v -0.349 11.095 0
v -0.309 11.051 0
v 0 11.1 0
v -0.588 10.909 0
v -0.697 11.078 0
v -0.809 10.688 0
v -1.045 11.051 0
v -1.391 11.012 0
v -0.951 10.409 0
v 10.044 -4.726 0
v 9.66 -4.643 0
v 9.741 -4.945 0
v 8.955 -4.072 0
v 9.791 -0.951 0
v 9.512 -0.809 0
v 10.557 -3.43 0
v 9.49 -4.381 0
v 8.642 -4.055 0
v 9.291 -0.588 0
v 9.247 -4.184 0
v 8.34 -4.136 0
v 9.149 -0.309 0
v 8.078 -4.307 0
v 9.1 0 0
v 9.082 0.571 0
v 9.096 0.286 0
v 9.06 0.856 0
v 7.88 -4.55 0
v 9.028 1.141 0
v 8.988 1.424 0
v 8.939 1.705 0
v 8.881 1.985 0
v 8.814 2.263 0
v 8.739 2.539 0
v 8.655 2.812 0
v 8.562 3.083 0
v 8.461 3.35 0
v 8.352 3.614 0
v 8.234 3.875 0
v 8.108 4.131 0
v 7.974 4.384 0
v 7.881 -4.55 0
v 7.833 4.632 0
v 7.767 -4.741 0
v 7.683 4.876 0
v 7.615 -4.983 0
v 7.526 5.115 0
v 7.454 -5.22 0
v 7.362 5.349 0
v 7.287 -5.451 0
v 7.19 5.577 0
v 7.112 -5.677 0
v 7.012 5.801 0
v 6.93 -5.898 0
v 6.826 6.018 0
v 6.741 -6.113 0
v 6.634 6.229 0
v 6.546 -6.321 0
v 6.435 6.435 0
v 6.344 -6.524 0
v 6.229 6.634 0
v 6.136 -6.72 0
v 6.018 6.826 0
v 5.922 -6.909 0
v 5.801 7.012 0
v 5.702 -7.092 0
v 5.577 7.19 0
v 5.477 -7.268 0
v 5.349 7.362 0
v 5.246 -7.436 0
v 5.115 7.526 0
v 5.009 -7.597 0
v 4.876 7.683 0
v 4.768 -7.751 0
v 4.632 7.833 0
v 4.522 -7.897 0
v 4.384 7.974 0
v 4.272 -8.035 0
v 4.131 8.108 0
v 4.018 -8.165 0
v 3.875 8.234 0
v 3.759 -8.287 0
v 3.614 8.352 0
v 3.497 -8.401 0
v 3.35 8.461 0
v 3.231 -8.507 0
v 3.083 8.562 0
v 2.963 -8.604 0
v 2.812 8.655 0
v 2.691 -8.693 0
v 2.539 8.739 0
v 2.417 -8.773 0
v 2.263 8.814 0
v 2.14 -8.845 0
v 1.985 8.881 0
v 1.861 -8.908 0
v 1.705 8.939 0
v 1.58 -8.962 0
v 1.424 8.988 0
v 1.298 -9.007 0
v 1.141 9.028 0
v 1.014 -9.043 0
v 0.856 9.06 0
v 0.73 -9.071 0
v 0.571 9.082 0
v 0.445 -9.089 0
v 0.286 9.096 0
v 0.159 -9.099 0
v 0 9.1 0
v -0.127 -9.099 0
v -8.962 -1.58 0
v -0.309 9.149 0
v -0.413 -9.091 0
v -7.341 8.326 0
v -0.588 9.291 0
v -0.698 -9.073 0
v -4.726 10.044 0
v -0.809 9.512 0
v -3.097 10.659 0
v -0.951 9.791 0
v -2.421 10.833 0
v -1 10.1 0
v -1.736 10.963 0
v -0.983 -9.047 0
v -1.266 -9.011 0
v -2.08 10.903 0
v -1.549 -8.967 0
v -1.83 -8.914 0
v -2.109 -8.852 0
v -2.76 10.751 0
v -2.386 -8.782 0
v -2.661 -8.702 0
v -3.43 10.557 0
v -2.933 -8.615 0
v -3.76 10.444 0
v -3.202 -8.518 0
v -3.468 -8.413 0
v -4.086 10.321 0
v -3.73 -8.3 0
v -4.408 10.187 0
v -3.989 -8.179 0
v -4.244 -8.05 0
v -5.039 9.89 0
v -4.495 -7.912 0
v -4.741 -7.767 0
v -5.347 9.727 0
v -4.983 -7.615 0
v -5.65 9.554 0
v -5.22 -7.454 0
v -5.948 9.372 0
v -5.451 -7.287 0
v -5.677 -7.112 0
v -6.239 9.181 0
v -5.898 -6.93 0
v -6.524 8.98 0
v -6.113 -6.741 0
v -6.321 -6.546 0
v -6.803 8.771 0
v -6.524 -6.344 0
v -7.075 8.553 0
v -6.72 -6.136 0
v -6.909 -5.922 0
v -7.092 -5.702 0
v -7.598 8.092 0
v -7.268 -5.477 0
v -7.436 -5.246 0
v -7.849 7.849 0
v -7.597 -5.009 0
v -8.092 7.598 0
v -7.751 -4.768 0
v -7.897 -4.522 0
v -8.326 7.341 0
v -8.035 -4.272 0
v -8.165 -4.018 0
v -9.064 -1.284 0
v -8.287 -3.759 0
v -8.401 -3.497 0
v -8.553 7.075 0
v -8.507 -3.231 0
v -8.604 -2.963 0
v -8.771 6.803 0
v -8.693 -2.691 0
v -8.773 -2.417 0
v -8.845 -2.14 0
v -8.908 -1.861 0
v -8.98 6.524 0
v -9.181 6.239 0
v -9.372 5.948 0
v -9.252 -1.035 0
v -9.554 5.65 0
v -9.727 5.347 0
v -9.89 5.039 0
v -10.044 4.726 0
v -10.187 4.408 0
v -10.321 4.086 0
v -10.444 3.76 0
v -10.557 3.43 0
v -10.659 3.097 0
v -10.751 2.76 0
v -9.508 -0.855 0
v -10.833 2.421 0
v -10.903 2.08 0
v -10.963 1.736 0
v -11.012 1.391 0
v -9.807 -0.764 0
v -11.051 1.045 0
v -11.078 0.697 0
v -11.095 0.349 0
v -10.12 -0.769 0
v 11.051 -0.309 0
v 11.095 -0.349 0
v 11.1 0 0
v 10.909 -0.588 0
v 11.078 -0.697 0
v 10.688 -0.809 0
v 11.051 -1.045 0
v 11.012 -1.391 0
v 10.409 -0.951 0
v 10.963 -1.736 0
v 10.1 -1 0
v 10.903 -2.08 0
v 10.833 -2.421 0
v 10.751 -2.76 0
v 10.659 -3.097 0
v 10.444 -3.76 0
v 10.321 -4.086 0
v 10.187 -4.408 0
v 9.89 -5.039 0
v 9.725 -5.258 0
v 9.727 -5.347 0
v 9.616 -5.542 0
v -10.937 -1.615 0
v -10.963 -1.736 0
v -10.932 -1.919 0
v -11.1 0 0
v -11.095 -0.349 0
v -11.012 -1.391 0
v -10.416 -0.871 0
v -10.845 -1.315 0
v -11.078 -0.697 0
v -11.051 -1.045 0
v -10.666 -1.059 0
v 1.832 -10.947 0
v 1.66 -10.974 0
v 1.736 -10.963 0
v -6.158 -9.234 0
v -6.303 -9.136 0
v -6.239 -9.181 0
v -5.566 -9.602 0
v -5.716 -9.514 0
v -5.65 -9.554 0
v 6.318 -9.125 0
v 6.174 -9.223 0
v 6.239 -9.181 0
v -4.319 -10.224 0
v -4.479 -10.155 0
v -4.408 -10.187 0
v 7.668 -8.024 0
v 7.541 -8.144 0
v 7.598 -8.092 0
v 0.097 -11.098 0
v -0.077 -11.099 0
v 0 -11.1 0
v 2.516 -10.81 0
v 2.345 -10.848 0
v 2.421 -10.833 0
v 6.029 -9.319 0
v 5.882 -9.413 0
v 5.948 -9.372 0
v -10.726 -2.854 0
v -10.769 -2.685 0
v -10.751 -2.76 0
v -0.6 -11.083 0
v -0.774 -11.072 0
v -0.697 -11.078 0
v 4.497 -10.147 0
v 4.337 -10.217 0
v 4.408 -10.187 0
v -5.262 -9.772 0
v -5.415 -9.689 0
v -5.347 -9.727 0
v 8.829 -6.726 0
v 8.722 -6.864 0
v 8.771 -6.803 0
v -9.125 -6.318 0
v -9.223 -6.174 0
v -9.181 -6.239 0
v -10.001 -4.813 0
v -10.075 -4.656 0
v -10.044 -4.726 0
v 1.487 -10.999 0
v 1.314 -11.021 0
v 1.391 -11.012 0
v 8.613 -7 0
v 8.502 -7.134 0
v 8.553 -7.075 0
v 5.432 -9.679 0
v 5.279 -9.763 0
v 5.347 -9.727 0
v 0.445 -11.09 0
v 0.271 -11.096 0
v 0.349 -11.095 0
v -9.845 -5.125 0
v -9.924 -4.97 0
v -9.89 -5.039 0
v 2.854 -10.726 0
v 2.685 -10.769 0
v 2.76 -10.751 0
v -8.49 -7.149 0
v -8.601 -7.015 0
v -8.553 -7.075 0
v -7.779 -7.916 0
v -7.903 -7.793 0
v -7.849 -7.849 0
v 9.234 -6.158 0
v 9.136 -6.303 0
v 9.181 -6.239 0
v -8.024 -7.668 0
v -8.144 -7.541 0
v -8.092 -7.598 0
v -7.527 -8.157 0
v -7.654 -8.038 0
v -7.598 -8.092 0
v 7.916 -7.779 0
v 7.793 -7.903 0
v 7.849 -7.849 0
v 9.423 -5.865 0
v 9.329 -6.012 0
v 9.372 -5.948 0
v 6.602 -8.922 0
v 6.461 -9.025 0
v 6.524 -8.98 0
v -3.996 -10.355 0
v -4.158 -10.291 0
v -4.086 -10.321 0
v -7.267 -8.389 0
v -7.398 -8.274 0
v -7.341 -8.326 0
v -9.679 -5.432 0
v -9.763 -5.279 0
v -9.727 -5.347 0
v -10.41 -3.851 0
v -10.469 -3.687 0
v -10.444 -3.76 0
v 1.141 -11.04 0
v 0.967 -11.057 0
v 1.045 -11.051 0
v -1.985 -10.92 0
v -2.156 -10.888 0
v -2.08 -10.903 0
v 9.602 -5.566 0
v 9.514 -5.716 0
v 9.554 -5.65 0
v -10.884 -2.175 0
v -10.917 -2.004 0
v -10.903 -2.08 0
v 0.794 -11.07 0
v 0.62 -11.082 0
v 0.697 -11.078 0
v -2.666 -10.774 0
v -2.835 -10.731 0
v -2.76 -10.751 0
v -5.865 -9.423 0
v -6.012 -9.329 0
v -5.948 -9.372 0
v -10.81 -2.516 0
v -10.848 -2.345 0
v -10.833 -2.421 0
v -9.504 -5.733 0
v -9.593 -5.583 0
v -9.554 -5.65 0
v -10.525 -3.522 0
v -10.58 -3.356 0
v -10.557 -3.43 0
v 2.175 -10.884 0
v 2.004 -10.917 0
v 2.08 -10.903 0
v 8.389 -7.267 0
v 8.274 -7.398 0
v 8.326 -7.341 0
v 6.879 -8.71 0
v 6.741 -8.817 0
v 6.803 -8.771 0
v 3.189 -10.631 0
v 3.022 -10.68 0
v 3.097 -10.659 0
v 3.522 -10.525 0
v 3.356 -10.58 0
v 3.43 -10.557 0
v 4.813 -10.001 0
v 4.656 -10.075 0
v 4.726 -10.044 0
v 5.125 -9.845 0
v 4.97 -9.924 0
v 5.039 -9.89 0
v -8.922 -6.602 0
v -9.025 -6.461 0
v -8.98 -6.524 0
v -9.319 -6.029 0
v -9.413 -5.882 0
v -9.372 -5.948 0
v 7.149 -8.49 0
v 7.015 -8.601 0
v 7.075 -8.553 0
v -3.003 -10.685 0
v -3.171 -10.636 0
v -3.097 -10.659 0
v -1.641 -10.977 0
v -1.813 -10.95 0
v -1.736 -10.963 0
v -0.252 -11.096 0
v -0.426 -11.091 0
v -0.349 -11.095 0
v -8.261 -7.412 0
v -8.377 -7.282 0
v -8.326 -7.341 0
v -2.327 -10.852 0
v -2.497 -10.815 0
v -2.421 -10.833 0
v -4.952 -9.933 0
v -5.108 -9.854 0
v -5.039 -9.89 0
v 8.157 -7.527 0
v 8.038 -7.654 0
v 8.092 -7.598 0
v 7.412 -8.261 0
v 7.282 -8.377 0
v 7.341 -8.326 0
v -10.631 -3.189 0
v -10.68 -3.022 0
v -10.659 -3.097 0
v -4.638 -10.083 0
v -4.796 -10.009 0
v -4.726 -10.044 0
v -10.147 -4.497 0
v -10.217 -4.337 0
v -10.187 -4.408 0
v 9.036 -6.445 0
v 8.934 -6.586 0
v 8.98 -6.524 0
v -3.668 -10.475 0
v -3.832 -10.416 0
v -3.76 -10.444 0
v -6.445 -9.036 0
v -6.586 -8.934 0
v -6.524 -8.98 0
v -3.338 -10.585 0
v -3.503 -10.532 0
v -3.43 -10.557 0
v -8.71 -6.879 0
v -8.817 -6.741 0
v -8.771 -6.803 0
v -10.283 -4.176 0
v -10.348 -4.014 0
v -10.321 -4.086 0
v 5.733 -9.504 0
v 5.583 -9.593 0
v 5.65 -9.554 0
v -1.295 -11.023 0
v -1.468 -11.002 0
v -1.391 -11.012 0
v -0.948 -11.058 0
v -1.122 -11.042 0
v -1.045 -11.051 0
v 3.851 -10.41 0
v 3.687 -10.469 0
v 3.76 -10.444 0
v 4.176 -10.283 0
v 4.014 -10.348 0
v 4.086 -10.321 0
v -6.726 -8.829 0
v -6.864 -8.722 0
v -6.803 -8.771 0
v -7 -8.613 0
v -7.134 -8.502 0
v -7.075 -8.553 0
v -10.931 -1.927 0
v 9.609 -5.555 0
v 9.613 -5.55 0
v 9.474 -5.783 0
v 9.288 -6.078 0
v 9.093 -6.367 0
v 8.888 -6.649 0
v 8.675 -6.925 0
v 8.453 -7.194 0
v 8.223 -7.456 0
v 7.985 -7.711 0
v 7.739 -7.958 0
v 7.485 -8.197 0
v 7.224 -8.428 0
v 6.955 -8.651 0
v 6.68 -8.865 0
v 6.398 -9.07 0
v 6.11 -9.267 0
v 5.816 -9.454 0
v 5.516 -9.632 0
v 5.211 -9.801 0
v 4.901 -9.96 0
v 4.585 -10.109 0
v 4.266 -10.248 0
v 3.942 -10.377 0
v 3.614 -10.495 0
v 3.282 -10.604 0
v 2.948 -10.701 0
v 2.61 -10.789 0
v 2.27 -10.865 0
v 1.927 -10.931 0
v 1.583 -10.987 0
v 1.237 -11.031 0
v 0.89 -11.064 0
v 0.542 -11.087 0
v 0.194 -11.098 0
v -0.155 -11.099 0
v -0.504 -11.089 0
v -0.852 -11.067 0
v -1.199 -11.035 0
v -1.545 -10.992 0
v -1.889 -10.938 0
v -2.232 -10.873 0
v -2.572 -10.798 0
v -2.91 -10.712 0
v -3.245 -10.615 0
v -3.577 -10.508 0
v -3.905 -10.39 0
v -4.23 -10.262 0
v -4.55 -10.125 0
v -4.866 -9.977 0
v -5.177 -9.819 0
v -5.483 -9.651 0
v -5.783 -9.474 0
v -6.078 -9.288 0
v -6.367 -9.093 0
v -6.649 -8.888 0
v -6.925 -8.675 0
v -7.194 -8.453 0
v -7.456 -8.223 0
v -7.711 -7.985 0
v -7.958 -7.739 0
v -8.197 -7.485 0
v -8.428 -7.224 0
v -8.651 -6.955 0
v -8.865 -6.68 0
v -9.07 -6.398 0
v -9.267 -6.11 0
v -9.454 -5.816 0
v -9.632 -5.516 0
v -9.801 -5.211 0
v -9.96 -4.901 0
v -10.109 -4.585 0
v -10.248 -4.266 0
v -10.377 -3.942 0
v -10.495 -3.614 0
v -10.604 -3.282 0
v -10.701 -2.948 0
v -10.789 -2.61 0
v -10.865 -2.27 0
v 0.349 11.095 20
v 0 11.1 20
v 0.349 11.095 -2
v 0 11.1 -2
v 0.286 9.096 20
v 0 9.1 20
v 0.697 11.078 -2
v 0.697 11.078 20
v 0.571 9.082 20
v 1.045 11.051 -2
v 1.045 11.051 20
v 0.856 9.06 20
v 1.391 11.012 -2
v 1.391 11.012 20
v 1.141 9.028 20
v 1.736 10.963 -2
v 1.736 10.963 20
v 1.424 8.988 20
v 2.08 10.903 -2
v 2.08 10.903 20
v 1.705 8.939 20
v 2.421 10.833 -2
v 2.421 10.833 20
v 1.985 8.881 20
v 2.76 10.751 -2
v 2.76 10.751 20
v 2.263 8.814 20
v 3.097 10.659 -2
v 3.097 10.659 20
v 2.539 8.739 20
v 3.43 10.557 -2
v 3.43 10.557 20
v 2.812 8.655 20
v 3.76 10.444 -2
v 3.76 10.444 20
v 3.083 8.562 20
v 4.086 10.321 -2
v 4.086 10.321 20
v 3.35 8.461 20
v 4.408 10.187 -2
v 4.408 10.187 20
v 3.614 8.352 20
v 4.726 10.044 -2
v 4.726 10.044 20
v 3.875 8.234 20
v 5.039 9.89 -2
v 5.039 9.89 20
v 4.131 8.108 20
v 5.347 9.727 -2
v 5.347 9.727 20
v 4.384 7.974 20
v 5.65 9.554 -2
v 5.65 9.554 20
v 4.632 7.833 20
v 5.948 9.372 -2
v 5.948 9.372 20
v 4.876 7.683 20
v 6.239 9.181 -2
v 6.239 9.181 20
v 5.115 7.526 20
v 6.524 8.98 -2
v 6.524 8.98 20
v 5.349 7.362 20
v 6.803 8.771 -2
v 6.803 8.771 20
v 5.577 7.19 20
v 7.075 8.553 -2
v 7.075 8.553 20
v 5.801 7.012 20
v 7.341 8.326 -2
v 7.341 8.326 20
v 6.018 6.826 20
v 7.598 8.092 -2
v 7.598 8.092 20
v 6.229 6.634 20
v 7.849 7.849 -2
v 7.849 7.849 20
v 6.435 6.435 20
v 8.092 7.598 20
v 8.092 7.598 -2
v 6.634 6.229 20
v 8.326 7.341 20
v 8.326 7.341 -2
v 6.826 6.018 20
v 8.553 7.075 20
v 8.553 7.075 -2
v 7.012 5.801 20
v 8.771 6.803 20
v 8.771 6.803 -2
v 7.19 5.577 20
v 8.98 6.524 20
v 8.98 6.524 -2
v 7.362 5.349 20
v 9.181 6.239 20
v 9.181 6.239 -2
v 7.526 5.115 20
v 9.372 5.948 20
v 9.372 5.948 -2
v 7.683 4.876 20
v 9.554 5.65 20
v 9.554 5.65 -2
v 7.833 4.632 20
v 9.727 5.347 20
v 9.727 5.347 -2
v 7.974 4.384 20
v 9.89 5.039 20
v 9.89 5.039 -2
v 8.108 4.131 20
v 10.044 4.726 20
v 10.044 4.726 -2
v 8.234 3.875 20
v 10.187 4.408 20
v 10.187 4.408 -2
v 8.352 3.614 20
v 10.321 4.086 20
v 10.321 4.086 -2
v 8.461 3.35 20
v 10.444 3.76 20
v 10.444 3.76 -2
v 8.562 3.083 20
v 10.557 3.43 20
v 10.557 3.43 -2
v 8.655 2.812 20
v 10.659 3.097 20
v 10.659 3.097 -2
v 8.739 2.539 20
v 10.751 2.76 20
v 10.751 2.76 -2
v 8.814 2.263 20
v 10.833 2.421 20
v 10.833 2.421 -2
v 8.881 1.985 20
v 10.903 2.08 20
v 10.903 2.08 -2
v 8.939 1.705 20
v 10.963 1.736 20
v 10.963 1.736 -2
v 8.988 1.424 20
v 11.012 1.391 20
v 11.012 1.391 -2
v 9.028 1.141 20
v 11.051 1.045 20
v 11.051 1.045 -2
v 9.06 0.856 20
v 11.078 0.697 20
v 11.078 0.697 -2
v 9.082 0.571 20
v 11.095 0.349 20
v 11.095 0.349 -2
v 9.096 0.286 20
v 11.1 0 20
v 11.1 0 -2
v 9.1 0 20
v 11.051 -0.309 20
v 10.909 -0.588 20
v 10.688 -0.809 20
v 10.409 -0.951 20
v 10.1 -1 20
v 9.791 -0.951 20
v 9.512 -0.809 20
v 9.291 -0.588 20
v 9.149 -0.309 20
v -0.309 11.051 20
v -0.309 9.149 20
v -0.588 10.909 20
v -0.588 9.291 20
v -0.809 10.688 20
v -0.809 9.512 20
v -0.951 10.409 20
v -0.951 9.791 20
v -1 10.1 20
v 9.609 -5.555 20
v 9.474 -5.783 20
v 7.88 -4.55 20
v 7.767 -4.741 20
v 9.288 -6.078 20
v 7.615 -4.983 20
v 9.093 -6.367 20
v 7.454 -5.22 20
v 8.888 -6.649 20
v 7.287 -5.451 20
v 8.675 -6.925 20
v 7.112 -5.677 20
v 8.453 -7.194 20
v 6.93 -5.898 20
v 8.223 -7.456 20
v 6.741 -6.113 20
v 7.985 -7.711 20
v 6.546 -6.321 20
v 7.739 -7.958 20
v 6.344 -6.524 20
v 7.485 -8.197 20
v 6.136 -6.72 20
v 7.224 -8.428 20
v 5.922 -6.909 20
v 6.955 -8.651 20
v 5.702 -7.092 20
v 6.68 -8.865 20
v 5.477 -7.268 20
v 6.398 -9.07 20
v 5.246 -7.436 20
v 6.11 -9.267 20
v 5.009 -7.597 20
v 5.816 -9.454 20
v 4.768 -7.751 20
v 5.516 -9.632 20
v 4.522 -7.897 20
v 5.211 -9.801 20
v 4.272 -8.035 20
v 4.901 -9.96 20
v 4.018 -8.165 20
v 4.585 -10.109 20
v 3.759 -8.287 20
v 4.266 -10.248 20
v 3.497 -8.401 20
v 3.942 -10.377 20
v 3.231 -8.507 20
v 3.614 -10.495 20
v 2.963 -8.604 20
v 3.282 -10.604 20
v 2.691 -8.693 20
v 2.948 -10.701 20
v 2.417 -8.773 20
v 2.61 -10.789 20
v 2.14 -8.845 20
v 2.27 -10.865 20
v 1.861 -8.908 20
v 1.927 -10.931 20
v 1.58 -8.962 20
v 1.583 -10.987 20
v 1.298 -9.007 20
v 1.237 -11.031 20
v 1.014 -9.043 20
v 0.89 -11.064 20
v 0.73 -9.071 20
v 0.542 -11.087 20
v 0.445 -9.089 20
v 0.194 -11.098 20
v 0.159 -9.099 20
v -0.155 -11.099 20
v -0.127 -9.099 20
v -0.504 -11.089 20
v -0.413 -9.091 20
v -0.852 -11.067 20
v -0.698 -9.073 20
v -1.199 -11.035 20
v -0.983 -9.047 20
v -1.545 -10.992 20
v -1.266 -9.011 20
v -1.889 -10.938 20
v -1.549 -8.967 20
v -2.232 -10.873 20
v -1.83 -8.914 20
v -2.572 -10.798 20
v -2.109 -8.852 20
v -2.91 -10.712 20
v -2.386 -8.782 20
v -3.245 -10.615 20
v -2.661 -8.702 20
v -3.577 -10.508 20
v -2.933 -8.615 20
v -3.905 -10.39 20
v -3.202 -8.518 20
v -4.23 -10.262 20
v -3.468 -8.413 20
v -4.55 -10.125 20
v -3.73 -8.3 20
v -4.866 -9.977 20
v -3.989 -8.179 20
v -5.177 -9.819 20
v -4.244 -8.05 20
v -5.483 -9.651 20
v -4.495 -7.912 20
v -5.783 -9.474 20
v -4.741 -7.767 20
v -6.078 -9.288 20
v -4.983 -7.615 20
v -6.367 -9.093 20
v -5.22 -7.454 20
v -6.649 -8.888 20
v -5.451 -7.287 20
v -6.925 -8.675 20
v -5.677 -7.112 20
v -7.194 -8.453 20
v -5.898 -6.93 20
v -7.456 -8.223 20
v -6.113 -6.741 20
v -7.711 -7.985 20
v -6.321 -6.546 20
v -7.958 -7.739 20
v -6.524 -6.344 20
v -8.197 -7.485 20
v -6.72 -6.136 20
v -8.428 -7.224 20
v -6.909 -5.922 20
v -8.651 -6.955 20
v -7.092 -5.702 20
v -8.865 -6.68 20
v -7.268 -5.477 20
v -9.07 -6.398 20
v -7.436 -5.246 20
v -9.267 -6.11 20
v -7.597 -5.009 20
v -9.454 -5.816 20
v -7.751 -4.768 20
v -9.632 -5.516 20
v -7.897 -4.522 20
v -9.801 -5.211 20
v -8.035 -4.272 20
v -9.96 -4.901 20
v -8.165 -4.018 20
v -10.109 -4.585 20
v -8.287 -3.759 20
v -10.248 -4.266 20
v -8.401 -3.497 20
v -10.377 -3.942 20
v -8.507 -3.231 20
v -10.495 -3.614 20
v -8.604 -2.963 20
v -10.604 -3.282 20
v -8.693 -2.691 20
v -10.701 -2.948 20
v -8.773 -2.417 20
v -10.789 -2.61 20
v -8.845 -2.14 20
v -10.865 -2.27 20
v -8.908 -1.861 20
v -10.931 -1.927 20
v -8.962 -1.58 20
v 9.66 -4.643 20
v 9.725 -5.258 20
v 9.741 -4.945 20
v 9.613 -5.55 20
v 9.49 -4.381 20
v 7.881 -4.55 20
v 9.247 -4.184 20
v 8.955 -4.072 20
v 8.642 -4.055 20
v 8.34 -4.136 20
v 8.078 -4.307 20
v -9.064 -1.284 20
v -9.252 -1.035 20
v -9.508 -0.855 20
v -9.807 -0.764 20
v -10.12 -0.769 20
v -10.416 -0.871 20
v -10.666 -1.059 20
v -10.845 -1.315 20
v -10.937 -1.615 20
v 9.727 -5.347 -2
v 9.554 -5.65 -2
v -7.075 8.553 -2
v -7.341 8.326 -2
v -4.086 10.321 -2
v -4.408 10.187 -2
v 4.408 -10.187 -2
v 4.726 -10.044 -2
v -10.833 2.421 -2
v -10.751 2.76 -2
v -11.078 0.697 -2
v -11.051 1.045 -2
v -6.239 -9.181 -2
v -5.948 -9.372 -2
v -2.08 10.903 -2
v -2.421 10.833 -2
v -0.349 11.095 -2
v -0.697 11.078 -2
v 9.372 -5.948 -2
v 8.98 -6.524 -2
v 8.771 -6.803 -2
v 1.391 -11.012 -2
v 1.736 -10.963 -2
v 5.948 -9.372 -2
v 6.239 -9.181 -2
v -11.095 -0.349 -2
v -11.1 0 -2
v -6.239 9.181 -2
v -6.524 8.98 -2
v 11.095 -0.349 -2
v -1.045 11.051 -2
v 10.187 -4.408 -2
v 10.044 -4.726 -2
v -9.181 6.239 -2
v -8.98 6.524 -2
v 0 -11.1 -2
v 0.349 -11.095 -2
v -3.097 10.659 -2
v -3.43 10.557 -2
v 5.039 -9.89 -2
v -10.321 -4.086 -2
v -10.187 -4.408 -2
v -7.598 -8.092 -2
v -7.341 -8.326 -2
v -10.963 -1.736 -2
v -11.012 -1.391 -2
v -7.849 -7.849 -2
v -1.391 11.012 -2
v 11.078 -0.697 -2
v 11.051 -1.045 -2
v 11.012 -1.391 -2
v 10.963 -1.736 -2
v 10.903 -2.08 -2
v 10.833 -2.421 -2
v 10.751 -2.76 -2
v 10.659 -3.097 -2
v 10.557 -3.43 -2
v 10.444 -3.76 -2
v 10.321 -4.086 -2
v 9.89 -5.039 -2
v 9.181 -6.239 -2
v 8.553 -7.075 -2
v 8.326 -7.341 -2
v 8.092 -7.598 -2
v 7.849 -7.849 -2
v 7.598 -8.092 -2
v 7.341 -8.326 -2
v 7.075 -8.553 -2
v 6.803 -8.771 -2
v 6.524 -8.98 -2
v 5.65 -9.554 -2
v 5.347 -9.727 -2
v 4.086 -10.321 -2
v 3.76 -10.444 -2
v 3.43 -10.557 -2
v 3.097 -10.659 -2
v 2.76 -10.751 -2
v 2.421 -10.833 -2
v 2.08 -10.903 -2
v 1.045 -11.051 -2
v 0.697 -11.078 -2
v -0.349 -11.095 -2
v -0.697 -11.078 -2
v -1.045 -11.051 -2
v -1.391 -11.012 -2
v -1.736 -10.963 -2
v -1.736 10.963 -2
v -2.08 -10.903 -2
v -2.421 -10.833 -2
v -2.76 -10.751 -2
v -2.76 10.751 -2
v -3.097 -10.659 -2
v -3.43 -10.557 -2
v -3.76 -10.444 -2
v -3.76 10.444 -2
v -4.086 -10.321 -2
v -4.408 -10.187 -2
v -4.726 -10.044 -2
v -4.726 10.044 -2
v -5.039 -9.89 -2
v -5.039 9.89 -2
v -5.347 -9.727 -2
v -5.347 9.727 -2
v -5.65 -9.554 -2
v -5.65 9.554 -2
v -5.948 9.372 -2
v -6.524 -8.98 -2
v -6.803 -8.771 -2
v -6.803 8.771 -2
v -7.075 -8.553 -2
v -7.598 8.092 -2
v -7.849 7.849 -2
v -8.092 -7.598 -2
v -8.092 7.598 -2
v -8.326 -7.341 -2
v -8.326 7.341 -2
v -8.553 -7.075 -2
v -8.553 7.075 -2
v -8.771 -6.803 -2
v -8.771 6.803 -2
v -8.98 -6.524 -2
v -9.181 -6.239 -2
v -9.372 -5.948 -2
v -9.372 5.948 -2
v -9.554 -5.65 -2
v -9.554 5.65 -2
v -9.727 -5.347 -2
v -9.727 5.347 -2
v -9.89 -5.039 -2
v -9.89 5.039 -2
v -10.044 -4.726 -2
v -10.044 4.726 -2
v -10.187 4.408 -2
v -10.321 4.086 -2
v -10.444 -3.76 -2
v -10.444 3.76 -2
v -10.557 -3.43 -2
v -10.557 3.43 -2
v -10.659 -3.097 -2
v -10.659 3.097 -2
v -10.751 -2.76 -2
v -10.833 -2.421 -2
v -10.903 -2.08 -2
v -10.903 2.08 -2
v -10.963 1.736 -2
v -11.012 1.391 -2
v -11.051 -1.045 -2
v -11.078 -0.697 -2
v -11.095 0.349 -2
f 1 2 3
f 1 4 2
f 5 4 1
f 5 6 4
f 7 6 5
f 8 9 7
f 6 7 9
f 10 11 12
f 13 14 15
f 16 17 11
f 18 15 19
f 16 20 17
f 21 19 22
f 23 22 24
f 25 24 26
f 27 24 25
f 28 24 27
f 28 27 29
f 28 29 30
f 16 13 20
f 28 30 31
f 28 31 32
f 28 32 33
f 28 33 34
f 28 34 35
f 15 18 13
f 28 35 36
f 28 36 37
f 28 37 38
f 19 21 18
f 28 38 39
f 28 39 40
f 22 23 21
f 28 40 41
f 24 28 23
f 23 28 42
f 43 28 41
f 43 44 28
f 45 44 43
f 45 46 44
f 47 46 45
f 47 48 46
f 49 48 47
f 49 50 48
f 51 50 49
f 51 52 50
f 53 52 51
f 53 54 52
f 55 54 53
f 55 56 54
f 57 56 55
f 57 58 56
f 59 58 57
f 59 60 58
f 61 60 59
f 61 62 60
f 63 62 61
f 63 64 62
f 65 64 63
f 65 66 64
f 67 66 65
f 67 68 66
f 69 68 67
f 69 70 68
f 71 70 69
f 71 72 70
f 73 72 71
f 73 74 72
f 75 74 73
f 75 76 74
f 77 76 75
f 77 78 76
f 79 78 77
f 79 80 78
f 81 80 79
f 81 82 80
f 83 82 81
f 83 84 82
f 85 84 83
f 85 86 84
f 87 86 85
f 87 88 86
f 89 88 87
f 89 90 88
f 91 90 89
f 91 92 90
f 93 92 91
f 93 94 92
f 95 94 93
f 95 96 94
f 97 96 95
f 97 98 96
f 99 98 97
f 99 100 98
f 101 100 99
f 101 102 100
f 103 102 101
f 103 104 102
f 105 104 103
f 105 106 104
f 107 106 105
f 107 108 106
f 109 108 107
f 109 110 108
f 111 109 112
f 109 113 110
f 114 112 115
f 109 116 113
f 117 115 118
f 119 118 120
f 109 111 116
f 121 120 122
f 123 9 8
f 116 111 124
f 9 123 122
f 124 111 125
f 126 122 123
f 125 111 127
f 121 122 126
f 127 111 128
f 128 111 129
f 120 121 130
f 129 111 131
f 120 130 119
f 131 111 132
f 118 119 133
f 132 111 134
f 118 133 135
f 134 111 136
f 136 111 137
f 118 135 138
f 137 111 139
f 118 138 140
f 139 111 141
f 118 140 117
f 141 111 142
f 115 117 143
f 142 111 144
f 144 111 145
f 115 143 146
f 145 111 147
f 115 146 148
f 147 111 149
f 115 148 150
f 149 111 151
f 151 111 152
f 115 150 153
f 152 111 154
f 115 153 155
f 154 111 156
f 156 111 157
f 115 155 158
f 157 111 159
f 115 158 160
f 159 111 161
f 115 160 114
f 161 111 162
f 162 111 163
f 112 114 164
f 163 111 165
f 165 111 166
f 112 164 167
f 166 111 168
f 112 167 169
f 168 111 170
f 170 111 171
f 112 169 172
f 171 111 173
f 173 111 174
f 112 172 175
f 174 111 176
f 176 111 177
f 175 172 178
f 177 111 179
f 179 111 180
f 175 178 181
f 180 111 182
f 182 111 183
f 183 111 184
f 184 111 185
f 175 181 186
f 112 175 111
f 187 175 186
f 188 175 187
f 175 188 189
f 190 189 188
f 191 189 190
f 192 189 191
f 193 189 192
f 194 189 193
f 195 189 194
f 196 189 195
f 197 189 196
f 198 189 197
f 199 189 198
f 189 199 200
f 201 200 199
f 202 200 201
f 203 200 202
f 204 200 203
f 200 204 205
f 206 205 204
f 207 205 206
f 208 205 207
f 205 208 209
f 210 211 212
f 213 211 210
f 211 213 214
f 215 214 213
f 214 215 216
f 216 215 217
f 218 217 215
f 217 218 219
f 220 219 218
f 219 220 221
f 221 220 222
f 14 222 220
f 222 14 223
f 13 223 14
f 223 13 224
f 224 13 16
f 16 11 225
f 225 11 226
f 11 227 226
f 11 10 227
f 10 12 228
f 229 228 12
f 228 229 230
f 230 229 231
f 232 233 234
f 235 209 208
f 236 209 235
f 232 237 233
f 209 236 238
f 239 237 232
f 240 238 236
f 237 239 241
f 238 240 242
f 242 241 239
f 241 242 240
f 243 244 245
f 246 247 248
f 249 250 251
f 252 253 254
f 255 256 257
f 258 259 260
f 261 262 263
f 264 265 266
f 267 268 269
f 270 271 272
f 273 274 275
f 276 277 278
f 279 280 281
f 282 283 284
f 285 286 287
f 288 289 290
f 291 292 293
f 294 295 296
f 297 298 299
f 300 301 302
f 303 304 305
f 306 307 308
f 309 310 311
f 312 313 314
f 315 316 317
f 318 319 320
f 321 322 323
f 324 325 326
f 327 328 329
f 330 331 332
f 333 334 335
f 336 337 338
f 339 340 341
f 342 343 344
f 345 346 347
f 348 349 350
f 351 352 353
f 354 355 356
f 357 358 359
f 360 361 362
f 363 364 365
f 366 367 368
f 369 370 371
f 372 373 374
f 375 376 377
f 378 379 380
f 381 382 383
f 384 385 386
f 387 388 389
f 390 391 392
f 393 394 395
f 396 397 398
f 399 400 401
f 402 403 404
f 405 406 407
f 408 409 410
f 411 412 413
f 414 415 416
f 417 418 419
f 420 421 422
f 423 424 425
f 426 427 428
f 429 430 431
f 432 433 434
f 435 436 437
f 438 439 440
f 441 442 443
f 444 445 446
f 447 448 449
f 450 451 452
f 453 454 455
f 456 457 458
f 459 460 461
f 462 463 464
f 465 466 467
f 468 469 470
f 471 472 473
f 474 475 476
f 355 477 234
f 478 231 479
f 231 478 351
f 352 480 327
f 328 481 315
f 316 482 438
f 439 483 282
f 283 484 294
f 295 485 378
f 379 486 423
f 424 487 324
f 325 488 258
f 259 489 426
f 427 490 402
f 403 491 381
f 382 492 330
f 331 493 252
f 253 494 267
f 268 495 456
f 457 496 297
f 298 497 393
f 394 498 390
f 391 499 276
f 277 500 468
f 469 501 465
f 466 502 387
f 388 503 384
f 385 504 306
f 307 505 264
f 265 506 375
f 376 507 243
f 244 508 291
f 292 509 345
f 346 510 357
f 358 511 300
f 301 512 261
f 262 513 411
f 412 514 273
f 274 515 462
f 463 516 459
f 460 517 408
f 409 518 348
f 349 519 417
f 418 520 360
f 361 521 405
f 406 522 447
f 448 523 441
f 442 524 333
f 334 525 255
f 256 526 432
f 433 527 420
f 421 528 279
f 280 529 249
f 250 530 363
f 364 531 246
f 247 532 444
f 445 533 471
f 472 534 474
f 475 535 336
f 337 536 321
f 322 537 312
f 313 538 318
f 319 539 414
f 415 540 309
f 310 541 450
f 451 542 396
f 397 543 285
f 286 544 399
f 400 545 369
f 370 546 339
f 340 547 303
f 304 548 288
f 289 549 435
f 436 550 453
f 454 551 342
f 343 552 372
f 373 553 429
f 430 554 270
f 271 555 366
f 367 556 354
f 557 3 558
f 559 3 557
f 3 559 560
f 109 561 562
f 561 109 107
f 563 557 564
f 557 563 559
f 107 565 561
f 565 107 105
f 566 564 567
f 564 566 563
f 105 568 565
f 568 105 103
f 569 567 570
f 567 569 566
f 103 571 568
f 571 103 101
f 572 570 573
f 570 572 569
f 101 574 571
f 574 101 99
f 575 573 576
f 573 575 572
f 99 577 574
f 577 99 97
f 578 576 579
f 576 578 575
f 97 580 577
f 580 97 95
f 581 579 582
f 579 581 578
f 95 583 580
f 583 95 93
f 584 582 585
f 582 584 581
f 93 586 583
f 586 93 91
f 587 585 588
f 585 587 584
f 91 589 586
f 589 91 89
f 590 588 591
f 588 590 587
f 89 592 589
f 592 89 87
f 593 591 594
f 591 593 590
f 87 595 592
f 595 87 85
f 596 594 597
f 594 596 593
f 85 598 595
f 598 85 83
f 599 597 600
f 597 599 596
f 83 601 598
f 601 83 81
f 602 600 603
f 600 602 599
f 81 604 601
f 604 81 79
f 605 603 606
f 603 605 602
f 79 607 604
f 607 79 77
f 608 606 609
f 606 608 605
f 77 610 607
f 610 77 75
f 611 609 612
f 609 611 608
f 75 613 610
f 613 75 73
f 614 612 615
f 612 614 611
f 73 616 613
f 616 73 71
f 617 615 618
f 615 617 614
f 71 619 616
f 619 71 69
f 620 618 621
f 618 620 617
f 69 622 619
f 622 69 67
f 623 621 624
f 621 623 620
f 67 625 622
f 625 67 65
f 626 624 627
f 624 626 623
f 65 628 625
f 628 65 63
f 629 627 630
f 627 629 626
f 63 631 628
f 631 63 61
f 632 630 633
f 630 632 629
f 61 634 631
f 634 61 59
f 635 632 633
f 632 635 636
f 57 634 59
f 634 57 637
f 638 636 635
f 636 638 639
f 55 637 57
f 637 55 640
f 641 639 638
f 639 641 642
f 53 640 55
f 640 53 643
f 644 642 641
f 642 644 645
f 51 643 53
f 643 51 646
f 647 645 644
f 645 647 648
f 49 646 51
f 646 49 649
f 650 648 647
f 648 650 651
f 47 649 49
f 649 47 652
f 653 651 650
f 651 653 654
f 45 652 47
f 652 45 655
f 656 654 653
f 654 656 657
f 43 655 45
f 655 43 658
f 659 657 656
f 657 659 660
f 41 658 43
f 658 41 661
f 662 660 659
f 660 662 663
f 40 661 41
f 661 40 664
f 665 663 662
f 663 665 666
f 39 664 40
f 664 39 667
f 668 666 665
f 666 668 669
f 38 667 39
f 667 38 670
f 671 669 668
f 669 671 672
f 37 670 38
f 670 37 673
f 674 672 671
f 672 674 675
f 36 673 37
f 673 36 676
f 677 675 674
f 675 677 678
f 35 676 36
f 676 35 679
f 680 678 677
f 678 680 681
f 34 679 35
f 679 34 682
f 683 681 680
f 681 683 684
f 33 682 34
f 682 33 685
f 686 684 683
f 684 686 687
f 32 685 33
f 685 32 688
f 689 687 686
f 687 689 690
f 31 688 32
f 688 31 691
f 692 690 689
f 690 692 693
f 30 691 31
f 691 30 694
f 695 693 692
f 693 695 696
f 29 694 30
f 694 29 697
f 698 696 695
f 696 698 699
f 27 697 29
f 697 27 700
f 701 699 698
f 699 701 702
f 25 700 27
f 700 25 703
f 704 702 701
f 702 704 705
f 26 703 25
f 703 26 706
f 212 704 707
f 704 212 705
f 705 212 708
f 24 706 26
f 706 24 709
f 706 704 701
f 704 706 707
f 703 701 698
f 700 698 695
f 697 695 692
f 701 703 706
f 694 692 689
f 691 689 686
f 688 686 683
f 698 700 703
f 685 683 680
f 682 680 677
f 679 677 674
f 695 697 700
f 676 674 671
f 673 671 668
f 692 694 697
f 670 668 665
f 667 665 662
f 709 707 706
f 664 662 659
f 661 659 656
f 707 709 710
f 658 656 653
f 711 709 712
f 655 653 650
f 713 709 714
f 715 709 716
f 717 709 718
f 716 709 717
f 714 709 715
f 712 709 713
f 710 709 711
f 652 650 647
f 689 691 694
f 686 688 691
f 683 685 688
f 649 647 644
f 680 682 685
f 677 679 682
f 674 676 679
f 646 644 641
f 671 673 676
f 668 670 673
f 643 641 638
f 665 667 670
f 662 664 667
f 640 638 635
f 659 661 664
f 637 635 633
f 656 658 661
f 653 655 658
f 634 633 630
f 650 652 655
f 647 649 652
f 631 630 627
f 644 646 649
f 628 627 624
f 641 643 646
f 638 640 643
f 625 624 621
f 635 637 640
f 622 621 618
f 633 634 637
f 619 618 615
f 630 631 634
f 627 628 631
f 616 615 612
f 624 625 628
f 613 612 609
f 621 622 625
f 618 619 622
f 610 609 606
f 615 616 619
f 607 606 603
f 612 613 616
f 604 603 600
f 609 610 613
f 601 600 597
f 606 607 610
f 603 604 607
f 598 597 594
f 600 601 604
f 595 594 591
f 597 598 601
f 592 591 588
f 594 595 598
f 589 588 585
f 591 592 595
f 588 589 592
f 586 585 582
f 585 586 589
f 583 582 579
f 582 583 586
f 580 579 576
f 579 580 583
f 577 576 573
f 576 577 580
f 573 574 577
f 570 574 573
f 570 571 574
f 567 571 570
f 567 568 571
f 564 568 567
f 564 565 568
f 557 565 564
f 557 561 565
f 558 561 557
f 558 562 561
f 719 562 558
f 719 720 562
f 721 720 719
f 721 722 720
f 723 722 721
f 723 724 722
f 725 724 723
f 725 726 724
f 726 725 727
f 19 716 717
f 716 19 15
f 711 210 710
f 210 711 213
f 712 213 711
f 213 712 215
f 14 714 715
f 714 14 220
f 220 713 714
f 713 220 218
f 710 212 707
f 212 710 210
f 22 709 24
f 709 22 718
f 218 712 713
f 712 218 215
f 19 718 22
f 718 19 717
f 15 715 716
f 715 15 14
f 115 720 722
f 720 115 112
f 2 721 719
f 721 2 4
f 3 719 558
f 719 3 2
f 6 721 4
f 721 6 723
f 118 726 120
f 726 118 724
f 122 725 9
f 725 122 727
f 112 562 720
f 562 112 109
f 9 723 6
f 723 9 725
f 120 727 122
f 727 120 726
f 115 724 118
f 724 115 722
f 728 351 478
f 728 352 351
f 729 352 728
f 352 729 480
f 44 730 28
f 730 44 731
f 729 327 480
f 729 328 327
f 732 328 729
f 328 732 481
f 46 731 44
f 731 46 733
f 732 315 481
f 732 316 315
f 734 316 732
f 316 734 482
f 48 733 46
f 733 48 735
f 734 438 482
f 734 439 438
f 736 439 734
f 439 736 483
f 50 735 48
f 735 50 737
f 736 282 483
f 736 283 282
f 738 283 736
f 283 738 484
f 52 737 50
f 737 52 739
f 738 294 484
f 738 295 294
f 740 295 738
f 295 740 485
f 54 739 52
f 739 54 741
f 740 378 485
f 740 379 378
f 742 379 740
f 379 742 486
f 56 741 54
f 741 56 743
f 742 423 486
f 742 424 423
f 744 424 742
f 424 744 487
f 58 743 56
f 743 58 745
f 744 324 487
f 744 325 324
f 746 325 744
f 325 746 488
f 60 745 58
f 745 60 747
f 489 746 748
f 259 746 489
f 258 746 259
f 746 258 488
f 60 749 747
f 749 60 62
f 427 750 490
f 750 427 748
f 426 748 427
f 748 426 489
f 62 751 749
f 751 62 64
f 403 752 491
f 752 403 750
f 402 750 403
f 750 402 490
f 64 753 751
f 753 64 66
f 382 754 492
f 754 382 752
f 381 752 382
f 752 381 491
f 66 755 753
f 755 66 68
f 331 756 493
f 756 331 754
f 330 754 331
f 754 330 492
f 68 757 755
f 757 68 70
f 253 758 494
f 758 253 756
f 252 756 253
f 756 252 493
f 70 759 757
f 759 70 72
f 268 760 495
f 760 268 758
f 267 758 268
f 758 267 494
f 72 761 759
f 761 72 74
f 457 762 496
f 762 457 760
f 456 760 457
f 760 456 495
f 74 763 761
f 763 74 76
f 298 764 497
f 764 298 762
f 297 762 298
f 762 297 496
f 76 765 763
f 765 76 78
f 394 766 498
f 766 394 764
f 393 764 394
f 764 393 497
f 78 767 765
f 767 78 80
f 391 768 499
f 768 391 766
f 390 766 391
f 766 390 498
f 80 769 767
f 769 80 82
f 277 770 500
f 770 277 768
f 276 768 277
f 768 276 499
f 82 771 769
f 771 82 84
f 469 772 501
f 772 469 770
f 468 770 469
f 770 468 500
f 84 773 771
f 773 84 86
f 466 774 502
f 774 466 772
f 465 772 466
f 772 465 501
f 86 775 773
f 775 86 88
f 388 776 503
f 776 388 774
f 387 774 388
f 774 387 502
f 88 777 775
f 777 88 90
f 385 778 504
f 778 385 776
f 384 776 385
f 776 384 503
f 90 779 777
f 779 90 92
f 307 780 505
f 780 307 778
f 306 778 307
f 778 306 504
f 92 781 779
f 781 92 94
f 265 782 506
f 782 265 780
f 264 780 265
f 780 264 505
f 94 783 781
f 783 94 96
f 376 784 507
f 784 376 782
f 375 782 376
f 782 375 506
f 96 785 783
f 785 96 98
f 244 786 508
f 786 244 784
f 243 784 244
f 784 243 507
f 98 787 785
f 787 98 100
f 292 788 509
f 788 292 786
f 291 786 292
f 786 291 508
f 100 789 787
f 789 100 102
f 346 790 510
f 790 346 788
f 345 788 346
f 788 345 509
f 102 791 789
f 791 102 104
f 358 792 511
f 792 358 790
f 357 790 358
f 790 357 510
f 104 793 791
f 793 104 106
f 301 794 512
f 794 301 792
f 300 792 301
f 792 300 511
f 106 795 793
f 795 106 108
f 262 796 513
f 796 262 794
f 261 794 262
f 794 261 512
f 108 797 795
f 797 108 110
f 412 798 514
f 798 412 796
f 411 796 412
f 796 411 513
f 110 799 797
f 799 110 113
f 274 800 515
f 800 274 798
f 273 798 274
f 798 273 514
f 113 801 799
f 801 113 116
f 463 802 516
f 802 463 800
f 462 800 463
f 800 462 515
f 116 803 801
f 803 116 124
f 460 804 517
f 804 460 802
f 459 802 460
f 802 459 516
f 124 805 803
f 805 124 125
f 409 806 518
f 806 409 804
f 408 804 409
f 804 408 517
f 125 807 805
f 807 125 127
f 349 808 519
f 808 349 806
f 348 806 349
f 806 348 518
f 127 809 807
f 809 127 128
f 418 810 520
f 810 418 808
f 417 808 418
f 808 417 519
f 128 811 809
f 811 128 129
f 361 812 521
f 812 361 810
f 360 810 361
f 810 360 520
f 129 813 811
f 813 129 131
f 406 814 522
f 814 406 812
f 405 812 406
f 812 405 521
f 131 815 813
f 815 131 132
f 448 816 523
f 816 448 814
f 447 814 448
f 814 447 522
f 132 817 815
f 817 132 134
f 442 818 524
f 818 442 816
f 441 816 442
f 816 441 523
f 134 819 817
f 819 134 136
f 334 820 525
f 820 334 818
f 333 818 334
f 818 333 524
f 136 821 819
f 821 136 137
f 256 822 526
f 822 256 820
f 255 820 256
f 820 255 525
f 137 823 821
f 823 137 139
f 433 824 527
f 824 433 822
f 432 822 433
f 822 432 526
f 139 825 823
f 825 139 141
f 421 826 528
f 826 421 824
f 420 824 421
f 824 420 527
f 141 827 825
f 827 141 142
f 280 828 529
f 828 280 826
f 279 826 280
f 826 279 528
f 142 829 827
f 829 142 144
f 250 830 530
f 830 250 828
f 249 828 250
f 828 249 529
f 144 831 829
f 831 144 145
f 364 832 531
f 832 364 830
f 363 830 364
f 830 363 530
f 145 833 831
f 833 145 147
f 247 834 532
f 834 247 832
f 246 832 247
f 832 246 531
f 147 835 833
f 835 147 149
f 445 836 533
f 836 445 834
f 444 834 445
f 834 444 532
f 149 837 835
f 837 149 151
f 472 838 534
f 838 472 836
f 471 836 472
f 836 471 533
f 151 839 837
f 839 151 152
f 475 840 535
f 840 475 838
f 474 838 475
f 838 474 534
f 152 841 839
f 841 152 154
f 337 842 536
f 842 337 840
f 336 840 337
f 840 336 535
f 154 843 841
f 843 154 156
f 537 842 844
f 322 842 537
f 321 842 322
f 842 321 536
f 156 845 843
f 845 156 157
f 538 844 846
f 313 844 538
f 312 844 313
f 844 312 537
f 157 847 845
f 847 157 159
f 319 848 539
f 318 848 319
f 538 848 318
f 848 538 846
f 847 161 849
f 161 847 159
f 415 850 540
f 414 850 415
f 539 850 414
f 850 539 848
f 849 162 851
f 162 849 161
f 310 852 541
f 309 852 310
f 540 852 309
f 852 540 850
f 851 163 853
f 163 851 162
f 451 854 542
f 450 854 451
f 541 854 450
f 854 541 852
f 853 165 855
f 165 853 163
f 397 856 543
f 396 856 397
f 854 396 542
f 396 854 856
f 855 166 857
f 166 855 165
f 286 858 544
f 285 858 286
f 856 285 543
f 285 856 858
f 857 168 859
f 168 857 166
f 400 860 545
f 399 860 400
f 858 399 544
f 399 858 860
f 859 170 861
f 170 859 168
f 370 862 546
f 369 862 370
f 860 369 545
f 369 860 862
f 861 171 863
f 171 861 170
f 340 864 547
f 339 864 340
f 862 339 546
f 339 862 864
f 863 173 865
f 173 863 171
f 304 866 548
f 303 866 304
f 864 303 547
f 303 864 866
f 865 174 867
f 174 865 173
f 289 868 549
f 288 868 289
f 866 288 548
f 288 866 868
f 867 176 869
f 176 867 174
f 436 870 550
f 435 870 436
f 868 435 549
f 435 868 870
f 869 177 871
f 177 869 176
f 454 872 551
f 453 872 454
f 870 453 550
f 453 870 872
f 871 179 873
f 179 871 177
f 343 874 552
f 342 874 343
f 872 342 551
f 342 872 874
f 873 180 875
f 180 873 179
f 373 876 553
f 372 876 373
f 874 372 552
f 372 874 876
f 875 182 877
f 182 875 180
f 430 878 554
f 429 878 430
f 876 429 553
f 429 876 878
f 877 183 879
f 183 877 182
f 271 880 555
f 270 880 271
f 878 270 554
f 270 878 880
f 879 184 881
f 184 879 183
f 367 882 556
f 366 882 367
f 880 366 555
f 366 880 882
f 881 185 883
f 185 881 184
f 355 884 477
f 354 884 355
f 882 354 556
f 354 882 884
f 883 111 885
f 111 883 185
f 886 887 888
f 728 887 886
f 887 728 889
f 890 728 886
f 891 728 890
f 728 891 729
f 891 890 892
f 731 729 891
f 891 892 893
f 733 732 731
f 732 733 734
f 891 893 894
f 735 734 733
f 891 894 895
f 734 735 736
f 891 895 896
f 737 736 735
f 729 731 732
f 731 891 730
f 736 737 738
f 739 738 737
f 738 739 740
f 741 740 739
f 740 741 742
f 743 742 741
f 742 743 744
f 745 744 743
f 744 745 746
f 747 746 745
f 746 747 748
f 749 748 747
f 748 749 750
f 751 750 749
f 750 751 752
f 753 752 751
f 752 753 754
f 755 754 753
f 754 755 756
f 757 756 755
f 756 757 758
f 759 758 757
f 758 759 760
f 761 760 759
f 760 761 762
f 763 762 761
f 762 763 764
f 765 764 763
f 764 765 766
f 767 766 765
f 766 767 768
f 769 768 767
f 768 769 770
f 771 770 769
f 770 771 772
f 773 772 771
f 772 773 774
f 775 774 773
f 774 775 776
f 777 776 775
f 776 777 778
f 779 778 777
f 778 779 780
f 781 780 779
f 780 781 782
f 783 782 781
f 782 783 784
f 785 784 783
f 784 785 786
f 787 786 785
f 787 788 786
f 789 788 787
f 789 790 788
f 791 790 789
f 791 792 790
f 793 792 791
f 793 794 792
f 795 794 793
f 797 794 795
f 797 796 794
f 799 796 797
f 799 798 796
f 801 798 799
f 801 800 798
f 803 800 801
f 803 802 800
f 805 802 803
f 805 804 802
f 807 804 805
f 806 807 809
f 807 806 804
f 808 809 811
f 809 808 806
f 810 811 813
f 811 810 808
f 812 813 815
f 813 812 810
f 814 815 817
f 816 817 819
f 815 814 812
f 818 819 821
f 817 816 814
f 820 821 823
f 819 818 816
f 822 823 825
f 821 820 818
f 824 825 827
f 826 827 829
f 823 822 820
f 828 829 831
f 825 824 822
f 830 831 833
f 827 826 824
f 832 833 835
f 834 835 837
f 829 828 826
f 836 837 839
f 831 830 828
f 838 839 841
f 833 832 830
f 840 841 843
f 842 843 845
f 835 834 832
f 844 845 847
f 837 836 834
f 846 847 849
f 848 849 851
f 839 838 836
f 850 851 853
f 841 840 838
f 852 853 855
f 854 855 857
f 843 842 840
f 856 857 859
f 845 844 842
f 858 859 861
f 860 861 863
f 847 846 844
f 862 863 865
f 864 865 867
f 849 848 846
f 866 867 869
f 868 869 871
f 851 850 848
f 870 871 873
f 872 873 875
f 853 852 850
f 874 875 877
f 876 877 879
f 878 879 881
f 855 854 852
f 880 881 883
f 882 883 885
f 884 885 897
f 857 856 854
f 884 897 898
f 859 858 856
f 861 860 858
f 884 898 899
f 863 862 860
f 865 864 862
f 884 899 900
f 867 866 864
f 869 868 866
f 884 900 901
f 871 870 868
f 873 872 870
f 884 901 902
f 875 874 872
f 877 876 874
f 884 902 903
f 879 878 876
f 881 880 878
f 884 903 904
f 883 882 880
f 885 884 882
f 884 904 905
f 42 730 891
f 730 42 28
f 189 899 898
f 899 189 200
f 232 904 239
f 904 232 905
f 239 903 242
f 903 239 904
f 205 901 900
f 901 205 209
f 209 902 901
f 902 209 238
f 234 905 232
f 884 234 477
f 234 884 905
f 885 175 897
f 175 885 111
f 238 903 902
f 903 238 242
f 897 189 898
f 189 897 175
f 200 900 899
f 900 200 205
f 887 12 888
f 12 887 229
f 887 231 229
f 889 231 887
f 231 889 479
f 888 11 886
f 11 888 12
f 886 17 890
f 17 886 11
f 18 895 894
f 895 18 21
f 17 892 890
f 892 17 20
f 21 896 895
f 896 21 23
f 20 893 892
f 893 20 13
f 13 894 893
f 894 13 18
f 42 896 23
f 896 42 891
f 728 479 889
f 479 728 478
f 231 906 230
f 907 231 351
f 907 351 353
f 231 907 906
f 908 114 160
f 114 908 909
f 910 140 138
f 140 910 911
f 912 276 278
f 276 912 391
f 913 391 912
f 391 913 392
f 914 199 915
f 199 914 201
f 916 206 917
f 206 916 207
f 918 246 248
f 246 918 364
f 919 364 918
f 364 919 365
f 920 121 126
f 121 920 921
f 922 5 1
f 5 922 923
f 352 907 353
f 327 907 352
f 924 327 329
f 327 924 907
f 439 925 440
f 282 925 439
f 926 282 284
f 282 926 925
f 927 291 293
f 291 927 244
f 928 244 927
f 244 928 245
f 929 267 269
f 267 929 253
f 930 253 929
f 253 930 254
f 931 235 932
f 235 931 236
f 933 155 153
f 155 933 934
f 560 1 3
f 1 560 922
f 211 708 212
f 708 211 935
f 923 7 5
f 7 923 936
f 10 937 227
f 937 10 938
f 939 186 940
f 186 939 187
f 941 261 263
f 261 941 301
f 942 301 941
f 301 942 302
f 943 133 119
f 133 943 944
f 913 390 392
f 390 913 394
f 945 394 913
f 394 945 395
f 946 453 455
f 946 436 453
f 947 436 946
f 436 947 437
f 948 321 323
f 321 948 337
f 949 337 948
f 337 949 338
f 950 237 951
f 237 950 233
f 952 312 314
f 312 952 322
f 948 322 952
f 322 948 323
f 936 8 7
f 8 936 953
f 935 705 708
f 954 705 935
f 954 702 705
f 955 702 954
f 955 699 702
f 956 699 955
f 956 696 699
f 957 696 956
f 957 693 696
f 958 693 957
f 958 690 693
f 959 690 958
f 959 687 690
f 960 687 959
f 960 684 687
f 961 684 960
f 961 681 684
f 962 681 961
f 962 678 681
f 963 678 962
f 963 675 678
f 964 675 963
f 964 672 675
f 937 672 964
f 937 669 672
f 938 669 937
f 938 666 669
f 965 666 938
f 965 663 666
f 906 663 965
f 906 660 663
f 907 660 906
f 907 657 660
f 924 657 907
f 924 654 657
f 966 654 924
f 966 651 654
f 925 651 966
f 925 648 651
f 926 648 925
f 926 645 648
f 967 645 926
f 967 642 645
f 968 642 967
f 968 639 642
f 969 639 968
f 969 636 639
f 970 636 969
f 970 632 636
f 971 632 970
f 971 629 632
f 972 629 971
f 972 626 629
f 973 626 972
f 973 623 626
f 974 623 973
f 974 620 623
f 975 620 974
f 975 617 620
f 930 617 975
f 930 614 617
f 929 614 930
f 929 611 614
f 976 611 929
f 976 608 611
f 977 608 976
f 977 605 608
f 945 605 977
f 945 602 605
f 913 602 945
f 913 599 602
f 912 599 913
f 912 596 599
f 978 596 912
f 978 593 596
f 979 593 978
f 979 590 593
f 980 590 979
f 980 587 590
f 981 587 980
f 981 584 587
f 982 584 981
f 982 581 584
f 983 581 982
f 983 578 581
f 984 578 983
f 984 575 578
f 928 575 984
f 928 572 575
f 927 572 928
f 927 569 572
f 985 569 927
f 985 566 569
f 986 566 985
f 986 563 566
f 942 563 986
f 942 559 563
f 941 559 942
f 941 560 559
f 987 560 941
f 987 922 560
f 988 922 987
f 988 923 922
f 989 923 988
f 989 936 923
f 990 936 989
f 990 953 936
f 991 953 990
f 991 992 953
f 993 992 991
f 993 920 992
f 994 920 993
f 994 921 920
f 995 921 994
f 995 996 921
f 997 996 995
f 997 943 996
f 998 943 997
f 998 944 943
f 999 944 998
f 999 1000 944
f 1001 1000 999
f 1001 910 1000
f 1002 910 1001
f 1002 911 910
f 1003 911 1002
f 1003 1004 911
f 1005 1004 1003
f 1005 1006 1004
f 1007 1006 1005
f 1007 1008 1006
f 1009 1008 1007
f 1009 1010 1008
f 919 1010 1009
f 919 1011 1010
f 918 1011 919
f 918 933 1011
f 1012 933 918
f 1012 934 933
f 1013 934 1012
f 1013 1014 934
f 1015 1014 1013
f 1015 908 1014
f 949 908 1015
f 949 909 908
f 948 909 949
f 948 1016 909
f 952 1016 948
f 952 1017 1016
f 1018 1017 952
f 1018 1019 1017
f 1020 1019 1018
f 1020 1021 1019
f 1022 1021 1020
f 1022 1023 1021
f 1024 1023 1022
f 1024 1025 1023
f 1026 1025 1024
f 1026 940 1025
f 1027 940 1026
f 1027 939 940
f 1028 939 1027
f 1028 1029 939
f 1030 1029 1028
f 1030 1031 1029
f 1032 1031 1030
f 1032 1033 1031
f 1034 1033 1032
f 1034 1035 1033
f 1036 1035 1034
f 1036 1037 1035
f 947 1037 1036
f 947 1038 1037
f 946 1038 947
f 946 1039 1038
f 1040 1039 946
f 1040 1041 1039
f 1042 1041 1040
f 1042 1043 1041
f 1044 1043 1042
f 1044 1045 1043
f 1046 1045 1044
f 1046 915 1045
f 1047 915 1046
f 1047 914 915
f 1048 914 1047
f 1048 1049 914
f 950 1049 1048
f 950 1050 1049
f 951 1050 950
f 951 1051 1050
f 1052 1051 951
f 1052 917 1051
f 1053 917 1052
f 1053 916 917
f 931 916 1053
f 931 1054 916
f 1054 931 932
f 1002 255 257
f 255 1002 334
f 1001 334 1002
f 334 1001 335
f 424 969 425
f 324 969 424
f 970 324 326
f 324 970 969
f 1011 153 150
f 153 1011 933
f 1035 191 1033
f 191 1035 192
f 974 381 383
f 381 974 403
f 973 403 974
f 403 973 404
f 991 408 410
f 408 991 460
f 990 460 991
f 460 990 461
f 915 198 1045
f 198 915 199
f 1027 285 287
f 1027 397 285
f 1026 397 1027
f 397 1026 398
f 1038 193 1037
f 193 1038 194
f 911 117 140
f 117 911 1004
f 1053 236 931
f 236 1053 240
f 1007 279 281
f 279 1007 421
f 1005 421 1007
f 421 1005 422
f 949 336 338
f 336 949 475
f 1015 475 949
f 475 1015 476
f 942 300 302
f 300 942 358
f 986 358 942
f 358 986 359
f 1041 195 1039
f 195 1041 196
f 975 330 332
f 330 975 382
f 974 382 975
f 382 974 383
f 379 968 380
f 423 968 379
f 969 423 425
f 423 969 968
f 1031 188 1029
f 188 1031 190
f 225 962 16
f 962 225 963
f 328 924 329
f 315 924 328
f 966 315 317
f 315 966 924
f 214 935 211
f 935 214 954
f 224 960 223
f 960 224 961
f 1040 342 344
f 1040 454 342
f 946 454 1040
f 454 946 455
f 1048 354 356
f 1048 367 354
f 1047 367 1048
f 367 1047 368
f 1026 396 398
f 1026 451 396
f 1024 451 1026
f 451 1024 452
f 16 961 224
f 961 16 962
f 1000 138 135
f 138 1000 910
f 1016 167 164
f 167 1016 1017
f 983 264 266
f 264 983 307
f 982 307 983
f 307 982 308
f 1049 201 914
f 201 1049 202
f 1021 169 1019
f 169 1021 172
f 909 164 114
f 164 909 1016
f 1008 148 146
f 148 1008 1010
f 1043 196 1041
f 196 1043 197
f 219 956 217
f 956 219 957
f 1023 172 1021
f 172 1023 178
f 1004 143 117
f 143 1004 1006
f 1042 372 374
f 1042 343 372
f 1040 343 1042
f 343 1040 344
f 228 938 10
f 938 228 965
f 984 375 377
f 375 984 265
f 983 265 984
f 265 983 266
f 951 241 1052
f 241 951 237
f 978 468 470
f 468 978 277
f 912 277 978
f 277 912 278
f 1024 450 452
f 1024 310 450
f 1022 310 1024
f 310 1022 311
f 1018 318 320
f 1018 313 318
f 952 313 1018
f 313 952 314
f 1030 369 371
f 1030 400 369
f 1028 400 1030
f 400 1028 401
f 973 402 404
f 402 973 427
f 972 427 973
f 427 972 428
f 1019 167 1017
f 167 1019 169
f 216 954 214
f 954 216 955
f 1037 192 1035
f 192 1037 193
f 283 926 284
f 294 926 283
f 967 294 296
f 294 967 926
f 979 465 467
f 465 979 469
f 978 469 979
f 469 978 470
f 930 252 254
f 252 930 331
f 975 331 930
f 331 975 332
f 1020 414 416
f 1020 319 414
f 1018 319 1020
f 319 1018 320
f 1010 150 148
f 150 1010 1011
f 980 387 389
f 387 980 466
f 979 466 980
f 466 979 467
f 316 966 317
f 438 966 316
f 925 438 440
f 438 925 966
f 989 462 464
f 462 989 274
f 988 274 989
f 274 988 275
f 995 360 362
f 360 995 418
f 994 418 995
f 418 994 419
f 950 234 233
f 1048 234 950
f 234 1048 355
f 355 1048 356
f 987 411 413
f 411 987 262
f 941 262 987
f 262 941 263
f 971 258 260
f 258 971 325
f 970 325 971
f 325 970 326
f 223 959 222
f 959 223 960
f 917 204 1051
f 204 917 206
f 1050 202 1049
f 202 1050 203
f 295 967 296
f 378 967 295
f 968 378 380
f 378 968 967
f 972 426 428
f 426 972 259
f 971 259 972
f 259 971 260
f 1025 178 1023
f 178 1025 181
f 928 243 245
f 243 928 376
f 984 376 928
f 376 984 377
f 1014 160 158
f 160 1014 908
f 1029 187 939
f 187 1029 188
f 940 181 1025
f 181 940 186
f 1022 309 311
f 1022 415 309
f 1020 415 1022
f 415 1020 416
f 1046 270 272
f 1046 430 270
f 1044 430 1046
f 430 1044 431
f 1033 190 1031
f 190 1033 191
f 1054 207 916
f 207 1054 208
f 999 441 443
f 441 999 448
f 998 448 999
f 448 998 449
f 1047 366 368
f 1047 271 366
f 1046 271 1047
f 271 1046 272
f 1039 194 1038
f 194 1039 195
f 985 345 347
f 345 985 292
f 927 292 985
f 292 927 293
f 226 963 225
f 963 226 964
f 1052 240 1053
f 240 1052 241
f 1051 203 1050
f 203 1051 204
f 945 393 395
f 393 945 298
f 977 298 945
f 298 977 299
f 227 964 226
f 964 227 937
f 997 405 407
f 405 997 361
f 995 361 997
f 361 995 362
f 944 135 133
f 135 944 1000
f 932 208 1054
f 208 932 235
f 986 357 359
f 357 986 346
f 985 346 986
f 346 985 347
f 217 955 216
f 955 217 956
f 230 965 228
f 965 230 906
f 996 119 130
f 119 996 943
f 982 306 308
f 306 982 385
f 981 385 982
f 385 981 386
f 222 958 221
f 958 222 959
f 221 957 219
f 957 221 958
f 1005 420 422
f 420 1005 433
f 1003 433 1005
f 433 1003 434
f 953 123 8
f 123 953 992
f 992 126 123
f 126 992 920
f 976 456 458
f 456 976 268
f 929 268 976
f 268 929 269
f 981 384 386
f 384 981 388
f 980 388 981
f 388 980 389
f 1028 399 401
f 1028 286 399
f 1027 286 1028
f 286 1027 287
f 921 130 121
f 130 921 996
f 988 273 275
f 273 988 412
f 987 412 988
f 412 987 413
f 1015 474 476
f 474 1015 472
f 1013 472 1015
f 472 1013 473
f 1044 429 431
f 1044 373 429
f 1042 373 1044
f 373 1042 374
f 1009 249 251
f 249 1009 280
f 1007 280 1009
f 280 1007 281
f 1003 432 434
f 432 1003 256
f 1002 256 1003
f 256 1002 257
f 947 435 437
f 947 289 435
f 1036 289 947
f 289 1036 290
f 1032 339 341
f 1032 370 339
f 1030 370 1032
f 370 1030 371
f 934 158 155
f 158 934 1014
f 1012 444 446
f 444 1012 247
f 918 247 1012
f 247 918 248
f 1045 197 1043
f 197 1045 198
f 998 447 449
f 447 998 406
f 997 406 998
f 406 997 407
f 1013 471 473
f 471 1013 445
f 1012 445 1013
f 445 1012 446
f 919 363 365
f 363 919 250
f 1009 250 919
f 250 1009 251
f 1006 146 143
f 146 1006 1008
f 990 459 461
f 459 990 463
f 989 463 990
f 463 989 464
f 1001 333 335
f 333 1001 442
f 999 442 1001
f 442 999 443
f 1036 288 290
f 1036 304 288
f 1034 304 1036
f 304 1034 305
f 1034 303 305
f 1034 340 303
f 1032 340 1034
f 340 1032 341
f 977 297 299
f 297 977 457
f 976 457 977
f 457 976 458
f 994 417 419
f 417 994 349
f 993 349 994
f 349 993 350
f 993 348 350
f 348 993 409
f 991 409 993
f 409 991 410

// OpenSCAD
INNER_DIAMETER = 18.2;
WALL_THICKNESS = 2;
OUTER_DIAMETER = INNER_DIAMETER + 2 * WALL_THICKNESS;
HEIGHT = 20;

INNER_RADIUS = INNER_DIAMETER / 2;
OUTER_RADIUS = OUTER_DIAMETER / 2;

translate([0, 0, -WALL_THICKNESS]) {
    cylinder(h = WALL_THICKNESS, d = OUTER_DIAMETER, $fn = 200);
}

rounded_arc(90);
rotate([0, 0, -170]) rounded_arc(140);

module rounded_arc(angular_size) {
    intersection() {
        rotate_extrude(convexity = 10, height = HEIGHT, $fn = 200) {
            translate([INNER_RADIUS, 0, 0]) {
                square([WALL_THICKNESS, HEIGHT]);
            }
        }
        
        // Limit the extrude to the angle given.
        linear_extrude(height = HEIGHT) {
            distance = OUTER_RADIUS / (cos(0.5 * angular_size));
            
            polygon(points = [[0, 0],
                                [distance, 0],
                                [distance*cos(angular_size), distance*sin(angular_size)]]);
        }
    }
    
    rounded_arc_end(0);
    rounded_arc_end(angular_size);
}

module rounded_arc_end(angle) {
    rotate([0, 0, angle]) translate([INNER_RADIUS + WALL_THICKNESS / 2, 0, 0]) {
        cylinder(h = HEIGHT, d = WALL_THICKNESS, $fn = 20);  
    }
}
